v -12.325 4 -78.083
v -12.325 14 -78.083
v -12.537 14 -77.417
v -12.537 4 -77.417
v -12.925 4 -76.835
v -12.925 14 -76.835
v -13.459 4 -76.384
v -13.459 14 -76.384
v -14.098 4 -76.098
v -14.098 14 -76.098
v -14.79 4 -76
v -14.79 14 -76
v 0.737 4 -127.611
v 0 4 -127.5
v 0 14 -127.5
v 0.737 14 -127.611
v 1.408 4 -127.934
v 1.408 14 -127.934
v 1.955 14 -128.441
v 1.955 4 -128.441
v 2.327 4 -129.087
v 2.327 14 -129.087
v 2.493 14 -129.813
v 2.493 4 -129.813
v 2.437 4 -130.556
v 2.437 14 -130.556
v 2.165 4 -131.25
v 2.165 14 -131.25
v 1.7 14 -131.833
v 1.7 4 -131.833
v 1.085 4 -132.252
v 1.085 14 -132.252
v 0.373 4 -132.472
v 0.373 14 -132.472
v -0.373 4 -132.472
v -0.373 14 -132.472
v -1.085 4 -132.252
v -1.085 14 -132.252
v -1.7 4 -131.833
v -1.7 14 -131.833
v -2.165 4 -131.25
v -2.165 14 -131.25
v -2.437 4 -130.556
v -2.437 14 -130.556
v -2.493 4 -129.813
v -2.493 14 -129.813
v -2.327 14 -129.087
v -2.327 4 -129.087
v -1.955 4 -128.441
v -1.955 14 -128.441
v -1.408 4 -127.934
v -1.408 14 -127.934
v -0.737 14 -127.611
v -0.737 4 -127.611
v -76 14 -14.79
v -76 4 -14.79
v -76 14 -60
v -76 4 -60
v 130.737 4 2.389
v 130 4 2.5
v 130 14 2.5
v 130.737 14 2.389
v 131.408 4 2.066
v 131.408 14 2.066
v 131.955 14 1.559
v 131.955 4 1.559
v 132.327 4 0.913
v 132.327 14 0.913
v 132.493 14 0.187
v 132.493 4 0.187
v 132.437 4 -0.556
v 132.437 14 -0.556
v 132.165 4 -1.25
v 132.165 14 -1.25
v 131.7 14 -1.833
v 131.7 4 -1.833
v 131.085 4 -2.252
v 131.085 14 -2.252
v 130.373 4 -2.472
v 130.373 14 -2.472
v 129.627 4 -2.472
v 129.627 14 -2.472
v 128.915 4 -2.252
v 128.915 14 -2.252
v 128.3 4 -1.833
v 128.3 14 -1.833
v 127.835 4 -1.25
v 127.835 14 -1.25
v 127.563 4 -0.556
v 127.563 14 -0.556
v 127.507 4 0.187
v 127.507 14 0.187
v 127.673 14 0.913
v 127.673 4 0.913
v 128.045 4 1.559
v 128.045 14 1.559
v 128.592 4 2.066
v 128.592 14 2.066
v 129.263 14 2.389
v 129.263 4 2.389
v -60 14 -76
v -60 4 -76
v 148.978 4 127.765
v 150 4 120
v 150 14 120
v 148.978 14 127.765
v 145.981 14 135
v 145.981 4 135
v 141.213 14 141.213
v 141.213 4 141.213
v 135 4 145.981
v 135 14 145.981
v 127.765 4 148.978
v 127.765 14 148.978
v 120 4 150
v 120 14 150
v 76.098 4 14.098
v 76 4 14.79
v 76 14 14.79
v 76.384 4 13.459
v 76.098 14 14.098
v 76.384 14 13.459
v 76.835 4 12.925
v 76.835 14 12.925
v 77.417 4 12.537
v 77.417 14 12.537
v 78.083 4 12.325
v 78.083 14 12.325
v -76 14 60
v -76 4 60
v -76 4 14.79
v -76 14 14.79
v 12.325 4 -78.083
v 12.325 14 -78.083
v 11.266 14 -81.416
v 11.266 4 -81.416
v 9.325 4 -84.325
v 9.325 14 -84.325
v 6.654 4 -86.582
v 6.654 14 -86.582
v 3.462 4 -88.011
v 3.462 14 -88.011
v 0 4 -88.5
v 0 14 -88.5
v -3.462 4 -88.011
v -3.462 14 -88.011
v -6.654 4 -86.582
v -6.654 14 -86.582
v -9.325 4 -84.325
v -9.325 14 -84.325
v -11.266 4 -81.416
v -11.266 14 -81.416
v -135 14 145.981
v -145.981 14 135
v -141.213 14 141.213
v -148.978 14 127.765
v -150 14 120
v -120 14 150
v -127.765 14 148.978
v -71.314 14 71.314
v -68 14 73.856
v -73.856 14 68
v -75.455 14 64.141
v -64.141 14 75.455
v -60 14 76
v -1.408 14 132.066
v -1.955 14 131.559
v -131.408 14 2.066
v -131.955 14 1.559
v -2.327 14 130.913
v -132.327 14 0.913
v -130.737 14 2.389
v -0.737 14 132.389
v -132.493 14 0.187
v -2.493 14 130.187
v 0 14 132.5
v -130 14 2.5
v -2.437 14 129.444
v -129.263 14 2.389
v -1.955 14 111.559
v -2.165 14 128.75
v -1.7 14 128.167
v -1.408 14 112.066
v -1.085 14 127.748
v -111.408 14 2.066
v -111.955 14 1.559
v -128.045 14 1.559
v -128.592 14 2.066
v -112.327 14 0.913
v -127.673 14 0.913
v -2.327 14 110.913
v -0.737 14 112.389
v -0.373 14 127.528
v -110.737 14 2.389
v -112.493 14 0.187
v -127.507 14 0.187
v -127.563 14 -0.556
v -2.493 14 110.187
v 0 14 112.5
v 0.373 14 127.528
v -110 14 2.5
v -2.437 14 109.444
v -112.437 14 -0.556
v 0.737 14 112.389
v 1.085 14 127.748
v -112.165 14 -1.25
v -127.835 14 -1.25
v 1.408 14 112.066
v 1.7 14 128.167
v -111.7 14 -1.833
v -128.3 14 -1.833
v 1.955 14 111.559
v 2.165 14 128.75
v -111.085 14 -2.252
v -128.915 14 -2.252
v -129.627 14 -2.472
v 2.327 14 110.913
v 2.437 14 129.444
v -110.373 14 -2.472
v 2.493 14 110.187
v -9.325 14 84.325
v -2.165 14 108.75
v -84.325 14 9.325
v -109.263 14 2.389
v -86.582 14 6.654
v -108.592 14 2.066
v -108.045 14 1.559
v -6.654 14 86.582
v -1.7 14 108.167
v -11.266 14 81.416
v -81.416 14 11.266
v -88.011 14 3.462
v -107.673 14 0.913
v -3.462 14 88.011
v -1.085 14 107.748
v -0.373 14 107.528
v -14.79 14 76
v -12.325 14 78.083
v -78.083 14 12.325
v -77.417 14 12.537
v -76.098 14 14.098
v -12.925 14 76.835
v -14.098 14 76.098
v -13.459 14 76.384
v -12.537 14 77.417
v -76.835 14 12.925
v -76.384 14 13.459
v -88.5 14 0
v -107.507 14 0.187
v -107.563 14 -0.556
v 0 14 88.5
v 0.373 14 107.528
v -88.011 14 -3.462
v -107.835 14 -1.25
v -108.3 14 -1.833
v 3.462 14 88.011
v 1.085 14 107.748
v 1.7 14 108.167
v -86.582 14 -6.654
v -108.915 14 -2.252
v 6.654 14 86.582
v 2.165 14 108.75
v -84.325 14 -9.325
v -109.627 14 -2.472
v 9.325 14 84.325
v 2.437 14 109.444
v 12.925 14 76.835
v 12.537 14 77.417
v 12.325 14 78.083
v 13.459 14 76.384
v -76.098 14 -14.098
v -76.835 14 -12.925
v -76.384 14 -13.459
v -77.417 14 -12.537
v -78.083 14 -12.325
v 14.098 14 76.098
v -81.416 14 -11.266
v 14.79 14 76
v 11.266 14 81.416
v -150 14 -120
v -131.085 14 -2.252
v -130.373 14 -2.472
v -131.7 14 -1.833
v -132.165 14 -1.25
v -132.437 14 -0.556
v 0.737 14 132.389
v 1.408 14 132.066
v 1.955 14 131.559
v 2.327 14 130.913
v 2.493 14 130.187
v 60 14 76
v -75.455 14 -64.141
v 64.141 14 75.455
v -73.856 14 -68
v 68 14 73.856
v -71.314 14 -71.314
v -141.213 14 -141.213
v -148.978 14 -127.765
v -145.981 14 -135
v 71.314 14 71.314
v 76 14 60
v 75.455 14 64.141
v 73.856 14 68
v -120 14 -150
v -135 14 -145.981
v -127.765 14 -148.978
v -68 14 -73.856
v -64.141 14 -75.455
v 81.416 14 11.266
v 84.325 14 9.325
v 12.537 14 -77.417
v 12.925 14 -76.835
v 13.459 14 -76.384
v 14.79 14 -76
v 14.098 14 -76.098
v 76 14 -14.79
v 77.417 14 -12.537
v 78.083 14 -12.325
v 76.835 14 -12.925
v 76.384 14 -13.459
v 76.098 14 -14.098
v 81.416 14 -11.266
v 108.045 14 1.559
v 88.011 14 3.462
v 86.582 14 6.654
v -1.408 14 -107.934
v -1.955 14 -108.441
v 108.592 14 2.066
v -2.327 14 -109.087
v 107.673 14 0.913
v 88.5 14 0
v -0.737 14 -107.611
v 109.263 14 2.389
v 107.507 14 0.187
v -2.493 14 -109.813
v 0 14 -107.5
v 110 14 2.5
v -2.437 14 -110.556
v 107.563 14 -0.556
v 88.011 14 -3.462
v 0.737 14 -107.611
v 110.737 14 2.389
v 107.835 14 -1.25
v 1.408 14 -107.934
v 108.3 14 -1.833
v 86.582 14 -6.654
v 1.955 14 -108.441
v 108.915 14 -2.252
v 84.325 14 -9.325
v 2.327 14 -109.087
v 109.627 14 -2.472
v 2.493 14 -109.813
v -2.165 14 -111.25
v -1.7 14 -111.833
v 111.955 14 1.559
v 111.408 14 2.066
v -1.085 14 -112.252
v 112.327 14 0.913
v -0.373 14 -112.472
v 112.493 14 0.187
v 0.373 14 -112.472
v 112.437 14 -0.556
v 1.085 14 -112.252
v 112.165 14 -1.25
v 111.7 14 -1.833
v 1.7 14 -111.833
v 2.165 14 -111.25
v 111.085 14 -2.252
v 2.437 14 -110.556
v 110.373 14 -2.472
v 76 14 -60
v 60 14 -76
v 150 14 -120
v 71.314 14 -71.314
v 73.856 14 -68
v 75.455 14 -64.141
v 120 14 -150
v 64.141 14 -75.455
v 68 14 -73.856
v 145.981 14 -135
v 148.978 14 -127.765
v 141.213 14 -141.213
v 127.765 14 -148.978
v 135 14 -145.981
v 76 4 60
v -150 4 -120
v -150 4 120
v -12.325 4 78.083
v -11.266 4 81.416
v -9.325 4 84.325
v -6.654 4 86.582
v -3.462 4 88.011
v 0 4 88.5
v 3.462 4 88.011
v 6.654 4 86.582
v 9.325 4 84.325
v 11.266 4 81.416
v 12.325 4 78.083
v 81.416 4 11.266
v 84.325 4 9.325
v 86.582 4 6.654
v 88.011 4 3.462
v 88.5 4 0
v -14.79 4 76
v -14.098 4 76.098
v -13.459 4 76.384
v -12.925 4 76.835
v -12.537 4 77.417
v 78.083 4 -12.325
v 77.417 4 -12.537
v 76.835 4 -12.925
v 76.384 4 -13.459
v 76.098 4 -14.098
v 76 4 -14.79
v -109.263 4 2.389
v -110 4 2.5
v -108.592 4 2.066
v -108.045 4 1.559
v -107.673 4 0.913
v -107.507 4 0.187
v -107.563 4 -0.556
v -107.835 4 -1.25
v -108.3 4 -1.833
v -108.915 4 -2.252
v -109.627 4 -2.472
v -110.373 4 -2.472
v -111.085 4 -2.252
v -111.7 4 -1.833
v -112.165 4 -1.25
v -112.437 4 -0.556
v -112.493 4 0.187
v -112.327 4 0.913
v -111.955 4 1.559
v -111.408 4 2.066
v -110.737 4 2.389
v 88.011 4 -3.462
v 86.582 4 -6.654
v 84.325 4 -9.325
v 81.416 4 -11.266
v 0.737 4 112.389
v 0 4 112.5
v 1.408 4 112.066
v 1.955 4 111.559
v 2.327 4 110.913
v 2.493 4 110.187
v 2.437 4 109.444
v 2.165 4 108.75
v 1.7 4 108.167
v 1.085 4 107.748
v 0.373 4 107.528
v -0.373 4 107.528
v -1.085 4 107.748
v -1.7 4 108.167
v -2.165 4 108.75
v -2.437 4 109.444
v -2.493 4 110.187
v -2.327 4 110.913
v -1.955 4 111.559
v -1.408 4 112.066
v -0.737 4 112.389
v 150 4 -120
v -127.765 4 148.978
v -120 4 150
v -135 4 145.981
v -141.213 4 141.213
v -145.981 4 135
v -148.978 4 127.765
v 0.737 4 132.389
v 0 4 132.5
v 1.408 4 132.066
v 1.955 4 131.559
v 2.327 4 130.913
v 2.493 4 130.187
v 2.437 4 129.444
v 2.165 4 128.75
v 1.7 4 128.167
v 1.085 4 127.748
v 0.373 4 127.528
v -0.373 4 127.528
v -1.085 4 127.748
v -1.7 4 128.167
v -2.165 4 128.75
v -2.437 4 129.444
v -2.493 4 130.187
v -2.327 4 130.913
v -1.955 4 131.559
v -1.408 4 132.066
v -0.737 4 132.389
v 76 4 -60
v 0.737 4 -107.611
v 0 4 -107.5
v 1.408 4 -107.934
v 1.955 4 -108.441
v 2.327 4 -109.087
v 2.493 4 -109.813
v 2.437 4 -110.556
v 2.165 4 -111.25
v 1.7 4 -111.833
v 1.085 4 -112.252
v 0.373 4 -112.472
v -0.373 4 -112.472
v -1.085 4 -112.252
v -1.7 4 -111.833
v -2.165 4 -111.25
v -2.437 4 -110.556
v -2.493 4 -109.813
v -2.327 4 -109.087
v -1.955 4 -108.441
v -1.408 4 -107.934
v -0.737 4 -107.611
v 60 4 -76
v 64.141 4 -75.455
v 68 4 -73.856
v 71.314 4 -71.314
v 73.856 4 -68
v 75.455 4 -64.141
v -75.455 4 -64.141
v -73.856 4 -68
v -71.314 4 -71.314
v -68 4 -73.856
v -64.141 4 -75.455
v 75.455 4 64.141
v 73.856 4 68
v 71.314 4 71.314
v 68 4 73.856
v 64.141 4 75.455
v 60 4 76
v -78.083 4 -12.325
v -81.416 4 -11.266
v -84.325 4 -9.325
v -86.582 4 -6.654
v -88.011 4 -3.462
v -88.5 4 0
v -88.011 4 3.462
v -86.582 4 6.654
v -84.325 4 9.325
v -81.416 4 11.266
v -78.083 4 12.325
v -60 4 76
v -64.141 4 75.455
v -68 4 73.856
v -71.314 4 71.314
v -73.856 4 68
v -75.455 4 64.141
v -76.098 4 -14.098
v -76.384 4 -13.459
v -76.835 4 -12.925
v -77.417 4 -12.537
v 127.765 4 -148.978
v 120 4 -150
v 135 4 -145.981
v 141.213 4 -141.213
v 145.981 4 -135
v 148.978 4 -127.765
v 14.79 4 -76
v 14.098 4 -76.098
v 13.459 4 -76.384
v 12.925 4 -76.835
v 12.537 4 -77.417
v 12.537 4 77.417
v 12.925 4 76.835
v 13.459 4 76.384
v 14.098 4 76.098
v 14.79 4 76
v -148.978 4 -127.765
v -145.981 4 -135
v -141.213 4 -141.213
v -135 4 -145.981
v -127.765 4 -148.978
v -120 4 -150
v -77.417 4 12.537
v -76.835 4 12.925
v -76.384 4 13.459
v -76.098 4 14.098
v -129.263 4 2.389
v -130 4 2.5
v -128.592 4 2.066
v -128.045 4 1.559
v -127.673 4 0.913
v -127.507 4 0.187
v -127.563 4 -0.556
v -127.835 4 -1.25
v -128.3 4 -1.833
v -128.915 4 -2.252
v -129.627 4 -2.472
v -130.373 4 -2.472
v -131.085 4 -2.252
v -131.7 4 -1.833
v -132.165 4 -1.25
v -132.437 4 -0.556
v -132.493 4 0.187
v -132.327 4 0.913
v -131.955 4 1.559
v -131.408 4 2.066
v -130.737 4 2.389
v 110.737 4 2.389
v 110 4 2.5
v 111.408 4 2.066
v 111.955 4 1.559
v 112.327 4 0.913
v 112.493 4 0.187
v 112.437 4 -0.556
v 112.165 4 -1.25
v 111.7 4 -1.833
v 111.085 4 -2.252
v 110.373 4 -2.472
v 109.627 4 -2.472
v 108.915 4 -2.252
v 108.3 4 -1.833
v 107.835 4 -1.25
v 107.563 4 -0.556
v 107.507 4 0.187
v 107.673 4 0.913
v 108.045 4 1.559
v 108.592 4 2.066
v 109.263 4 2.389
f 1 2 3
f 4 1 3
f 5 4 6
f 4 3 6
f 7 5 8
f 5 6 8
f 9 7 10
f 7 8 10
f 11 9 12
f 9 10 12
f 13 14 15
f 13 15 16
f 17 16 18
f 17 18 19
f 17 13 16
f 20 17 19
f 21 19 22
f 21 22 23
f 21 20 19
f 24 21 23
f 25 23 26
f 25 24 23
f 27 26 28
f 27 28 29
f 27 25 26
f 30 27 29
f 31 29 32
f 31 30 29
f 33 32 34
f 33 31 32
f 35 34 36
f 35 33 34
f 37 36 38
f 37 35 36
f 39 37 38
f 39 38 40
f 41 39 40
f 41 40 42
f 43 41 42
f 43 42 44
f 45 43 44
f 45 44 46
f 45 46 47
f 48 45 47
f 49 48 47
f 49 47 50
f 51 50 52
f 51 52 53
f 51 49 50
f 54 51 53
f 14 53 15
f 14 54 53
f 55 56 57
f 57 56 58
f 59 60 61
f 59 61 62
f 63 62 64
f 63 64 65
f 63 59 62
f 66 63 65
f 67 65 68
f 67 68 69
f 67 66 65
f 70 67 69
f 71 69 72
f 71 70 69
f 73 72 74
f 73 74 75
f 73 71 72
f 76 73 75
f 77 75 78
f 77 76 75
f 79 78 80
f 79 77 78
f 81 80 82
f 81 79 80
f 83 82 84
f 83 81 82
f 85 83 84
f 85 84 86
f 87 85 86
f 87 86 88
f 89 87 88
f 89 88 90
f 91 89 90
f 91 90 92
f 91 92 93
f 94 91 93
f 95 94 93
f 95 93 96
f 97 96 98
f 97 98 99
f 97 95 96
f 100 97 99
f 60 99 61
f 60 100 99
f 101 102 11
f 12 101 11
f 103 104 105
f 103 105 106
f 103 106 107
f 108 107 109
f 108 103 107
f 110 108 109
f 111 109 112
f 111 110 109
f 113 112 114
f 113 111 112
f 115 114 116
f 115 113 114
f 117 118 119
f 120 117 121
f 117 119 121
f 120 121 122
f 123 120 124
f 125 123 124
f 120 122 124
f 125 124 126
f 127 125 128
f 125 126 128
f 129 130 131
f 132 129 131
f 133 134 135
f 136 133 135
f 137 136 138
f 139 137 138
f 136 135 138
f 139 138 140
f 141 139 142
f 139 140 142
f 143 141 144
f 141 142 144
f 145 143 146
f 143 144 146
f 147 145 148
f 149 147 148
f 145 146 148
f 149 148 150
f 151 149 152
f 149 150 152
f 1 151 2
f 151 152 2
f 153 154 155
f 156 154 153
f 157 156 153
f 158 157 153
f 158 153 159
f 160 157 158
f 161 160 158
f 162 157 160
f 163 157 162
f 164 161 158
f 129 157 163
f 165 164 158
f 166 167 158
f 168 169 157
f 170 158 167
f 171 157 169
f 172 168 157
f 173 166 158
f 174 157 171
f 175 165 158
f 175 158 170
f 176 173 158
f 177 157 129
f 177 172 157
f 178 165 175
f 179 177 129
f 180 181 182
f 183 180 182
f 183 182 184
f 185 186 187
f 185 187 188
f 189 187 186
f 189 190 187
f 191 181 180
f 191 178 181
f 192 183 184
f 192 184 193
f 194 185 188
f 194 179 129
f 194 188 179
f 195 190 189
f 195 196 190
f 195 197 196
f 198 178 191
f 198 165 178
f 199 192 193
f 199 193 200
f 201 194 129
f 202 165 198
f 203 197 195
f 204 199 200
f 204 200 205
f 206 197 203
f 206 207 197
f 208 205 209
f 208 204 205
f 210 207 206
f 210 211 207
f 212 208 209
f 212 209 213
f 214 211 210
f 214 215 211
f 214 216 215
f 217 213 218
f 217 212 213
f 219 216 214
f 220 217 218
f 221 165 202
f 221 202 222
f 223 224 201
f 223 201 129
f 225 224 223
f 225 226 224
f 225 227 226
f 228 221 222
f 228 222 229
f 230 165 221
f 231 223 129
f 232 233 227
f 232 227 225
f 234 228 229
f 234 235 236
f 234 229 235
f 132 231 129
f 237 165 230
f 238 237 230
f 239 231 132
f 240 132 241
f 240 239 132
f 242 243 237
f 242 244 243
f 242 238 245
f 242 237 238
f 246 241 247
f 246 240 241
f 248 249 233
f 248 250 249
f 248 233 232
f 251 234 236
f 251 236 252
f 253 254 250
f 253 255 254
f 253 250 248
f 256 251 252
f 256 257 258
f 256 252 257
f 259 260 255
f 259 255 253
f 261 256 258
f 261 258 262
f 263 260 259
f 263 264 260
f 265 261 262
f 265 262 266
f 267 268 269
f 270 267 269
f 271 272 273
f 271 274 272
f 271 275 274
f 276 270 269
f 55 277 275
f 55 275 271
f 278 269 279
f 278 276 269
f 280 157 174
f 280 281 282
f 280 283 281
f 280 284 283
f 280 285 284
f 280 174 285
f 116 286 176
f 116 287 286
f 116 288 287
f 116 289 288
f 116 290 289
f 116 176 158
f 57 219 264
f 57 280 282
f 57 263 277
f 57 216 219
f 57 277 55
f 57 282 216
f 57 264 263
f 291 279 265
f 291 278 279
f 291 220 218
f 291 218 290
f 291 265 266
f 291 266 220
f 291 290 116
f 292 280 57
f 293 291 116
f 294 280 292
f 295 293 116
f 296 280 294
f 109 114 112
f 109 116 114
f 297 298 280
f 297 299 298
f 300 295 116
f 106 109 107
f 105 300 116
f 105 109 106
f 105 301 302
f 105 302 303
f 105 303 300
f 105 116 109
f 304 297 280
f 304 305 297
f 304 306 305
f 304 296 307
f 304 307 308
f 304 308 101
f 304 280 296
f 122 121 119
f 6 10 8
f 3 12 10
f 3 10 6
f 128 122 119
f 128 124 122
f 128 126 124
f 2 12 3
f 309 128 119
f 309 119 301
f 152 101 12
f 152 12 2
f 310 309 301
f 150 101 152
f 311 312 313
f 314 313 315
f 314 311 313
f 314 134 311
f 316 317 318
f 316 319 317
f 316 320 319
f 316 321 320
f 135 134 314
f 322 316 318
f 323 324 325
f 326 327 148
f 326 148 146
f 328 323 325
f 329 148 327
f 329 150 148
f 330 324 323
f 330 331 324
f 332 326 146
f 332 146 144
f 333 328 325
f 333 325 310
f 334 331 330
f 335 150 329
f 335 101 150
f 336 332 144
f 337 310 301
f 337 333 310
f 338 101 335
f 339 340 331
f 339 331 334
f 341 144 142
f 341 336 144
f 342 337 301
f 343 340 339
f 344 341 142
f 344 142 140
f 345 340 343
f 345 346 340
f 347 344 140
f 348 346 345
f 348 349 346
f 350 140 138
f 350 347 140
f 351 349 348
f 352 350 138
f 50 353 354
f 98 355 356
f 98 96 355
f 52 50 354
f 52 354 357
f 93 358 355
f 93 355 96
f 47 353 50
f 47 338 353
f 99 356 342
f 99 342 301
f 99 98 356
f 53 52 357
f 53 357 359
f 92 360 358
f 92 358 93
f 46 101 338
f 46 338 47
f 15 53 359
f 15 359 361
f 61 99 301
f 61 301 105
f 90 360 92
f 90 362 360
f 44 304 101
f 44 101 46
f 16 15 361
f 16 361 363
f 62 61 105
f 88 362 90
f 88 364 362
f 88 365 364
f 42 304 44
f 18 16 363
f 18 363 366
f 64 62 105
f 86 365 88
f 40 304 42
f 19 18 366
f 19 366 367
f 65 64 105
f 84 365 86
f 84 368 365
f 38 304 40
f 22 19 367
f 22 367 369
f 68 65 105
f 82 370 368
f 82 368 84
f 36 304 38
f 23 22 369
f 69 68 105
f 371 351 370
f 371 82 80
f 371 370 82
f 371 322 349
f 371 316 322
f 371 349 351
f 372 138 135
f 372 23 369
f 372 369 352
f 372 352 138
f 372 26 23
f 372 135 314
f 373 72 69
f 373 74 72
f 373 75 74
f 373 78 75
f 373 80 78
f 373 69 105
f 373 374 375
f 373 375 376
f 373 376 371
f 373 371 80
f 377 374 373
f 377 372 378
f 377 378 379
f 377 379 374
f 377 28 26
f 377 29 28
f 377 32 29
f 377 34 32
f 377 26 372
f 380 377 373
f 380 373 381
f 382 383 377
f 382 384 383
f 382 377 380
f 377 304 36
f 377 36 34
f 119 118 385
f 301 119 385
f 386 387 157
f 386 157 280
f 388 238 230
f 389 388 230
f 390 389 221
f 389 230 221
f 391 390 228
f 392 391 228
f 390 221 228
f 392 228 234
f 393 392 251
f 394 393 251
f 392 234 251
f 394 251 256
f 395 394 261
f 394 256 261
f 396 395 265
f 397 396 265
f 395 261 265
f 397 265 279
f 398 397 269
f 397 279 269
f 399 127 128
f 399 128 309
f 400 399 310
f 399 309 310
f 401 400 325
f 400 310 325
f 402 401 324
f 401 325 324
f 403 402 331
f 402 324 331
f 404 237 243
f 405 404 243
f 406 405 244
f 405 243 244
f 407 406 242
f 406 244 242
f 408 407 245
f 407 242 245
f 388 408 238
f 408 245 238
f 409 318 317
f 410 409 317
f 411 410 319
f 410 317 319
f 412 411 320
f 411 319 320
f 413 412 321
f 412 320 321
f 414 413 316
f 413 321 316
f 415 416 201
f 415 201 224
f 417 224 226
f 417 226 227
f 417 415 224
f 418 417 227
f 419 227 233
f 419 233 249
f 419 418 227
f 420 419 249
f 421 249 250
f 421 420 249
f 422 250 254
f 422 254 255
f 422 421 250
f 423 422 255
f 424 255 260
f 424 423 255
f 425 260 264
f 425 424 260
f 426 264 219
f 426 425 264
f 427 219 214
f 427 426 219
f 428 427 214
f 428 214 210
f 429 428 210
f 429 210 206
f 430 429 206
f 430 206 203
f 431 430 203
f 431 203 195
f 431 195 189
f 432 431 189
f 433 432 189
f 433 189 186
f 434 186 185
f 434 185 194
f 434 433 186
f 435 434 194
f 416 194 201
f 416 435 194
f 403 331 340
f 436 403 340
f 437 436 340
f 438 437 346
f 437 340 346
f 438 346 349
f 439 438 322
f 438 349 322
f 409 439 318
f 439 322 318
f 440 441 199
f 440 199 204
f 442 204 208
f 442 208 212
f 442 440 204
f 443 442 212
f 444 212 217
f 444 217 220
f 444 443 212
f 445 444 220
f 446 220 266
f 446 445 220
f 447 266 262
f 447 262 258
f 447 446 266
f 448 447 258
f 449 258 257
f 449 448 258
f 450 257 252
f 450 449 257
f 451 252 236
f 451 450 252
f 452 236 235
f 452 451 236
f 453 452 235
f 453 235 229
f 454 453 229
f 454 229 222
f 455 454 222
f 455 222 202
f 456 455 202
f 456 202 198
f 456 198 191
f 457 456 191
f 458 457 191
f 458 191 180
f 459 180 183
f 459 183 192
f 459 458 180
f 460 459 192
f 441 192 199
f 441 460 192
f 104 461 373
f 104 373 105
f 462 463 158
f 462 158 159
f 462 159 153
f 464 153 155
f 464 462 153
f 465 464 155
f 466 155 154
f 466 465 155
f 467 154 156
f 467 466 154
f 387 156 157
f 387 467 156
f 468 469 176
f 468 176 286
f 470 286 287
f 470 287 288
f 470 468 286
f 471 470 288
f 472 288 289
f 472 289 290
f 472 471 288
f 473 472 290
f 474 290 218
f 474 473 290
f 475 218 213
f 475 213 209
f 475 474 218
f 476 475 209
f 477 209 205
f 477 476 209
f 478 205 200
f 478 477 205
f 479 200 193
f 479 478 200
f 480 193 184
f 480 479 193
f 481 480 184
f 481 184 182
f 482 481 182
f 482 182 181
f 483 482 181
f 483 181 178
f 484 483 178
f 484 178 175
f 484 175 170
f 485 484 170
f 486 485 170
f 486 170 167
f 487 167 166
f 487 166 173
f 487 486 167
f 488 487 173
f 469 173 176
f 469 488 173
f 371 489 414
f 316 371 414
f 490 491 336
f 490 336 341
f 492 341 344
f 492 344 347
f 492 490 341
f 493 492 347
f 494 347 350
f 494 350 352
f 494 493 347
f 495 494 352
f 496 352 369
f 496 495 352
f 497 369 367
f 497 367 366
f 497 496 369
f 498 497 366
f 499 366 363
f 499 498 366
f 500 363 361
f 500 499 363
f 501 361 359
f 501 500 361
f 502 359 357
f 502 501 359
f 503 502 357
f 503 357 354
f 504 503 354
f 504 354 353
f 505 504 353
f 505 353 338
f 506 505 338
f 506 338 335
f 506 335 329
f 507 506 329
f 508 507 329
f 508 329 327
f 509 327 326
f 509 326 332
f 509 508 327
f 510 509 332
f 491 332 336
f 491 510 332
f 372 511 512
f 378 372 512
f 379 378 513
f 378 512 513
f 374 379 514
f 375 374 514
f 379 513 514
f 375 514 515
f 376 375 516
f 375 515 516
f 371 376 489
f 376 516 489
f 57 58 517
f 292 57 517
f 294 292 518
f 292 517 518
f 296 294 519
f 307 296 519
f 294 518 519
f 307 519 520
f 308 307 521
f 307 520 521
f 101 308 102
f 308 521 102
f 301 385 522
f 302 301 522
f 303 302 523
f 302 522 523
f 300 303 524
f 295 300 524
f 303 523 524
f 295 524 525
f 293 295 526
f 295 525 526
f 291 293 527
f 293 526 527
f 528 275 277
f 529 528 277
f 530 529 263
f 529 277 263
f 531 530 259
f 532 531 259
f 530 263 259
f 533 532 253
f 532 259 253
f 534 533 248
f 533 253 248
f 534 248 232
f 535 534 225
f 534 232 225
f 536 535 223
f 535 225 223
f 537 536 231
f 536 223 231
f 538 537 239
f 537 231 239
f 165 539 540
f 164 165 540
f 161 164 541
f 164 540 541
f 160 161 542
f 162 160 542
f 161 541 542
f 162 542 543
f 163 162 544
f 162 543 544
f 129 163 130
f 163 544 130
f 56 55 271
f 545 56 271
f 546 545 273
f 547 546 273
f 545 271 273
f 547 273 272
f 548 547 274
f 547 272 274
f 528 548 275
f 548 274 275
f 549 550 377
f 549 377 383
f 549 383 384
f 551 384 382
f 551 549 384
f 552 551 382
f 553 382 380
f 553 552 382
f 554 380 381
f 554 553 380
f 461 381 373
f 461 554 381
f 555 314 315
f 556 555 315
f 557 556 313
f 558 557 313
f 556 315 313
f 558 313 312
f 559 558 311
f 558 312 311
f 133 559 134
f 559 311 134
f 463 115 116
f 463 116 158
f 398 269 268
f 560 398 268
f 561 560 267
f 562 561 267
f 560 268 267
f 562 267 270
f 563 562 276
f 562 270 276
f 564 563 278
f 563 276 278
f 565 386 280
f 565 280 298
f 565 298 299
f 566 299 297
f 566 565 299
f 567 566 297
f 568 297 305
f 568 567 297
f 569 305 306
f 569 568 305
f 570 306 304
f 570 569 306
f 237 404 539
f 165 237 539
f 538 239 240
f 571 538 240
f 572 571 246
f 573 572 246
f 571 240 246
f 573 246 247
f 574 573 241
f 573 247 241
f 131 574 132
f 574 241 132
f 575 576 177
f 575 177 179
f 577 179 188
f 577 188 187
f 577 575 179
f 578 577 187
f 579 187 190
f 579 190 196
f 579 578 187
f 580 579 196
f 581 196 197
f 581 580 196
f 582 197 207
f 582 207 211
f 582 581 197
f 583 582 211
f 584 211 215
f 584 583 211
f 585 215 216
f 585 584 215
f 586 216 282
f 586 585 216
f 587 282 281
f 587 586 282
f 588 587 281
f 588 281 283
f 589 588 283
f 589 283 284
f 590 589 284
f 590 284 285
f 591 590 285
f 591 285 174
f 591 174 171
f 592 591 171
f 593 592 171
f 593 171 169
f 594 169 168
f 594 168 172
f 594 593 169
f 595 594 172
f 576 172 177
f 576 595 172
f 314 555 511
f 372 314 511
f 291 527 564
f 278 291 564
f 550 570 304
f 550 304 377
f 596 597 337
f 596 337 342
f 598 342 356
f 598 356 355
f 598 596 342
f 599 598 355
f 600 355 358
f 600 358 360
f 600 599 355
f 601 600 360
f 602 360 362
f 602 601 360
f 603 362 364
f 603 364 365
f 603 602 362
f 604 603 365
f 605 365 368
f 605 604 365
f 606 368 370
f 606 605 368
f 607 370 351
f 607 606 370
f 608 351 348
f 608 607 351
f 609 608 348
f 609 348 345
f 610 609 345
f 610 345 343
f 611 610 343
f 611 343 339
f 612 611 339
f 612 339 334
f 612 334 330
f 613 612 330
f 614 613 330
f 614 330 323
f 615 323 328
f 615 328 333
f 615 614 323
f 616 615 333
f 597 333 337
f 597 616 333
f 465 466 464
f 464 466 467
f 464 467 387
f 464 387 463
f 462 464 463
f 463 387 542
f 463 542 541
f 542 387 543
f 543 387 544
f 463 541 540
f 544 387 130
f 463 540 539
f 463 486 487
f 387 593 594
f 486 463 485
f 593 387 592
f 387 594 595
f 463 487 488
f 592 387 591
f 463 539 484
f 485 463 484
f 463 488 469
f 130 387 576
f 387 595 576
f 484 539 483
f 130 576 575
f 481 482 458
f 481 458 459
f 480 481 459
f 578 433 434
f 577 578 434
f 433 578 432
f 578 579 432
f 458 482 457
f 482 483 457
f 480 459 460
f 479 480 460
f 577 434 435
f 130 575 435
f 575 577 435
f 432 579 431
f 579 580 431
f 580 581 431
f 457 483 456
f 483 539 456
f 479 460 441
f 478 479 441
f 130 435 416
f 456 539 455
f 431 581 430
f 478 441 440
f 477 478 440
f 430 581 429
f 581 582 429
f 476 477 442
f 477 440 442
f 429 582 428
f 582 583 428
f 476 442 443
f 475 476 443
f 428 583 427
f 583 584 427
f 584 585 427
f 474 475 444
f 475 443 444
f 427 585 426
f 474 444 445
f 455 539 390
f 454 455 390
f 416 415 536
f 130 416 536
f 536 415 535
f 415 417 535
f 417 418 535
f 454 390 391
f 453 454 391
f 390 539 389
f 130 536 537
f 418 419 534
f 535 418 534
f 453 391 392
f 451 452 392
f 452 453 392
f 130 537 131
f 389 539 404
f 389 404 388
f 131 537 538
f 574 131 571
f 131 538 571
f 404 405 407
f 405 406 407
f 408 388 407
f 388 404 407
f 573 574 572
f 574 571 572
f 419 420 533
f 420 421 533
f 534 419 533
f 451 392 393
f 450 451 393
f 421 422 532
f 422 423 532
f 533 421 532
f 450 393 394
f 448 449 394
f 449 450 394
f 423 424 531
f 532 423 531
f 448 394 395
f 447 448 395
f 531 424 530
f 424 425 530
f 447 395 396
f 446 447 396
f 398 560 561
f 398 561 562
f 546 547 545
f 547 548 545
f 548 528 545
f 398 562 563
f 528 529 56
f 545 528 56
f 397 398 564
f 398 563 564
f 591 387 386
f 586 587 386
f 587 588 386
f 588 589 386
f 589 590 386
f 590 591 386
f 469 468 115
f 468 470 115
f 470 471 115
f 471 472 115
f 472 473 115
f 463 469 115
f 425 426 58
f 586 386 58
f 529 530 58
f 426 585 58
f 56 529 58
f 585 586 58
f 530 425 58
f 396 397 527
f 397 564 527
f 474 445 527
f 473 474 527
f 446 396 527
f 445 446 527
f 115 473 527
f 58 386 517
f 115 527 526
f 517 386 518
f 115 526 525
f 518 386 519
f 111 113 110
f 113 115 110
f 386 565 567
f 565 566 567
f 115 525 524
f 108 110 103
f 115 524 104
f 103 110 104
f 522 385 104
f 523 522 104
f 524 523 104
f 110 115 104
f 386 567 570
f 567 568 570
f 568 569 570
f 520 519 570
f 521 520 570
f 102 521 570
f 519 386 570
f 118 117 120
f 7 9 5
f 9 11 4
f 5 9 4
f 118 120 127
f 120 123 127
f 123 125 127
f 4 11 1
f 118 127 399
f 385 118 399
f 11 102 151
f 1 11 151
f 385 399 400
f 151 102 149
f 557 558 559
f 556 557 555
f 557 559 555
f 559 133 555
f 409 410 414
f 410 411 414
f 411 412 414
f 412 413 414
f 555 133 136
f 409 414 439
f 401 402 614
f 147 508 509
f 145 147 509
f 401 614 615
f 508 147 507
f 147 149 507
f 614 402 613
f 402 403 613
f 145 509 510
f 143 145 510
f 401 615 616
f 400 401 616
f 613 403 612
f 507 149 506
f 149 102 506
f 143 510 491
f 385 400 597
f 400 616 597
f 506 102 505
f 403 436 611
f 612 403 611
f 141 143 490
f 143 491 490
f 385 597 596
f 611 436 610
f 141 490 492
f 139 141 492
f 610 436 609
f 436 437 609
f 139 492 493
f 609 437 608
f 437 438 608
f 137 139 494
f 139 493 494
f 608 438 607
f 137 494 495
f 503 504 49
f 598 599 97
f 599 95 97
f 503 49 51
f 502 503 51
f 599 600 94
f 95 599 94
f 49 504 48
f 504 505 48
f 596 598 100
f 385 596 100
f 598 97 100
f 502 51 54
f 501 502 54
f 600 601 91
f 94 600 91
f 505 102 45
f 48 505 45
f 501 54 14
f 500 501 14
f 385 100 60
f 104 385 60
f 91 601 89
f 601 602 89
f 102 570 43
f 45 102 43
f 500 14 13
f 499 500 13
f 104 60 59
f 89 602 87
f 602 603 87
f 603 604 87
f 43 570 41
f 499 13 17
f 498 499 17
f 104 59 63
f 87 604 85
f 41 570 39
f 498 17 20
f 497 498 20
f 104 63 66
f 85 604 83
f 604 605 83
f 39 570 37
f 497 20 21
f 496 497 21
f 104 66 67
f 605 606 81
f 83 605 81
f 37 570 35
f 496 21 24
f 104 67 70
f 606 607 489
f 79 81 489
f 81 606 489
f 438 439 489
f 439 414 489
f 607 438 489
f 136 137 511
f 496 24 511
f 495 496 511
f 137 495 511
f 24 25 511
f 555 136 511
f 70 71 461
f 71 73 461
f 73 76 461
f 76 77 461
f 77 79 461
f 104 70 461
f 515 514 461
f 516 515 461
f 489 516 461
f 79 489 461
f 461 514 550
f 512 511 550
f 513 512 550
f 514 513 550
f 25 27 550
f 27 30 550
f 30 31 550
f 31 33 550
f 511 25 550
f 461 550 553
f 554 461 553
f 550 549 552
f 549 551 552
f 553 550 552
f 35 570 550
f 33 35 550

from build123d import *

# Parameters (mm, degrees)
BOSS_EXTRUDE3_DEPTH = 4
SKETCH2_R           = 2.5
BOSS_EXTRUDE4_DEPTH = 10
CUT_EXTRUDE1_DEPTH  = 52
CUT_EXTRUDE2_DEPTH  = 10


with BuildPart() as part:
    # Sketch1 → Boss-Extrude3 (new body)
    with BuildSketch(Plane(origin=(0, 0, 0), x_dir=(1, 0, 0), z_dir=(0, 1, 0))):
        with BuildLine():
            ThreePointArc((-75, -60), (-70.606601718, -70.606601718), (-60, -75))
            Line((-60, -75), (60, -75))
            ThreePointArc((60, -75), (70.606601718, -70.606601718), (75, -60))
            Line((75, -60), (75, 60))
            ThreePointArc((75, 60), (70.606601718, 70.606601718), (60, 75))
            Line((60, 75), (-60, 75))
            ThreePointArc((-60, 75), (-70.606601718, 70.606601718), (-75, 60))
            Line((-75, 60), (-75, -60))
        make_face()
    extrude(amount=BOSS_EXTRUDE3_DEPTH)

    # Sketch3 → Cut-Extrude1 (cut)
    with BuildSketch(Plane(origin=(0, 14, 0), x_dir=(1, 0, 0), z_dir=(0, 1, 0))):
        with BuildLine():
            Line((-60, 76), (60, 76))
            ThreePointArc((60, 76), (71.313708499, 71.313708499), (76, 60))
            Line((76, 60), (76, -60))
            ThreePointArc((76, -60), (71.313708499, -71.313708499), (60, -76))
            Line((60, -76), (-60, -76))
            ThreePointArc((-60, -76), (-71.313708499, -71.313708499), (-76, -60))
            Line((-76, -60), (-76, 60))
            ThreePointArc((-76, 60), (-71.313708499, 71.313708499), (-60, 76))
        make_face()
    extrude(amount=-CUT_EXTRUDE1_DEPTH, mode=Mode.SUBTRACT)


with BuildPart() as body_2:
    # Sketch2 → Boss-Extrude4 (new body)
    # profile 1 of 5: a face of its own
    with BuildSketch(Plane(origin=(0, 4, 0), x_dir=(1, 0, 0), z_dir=(0, 1, 0))):
        with BuildLine():
            ThreePointArc((150, -120), (141.213203436, -141.213203436), (120, -150))
            Line((120, -150), (-120, -150))
            ThreePointArc((-120, -150), (-141.213203436, -141.213203436), (-150, -120))
            Line((-150, -120), (-150, 120))
            ThreePointArc((-150, 120), (-141.213203436, 141.213203436), (-120, 150))
            Line((-120, 150), (120, 150))
            ThreePointArc((120, 150), (141.213203436, 141.213203436), (150, 120))
            Line((150, 120), (150, -120))
        make_face()
        with Locations(Location((-110, 0, 0), (0, 0, 270))):
            Circle(SKETCH2_R, mode=Mode.SUBTRACT)
        with Locations(Location((-130, 0, 0), (0, 0, 270))):
            Circle(SKETCH2_R, mode=Mode.SUBTRACT)
        with Locations(Location((130, 0, 0), (0, 0, 270))):
            Circle(SKETCH2_R, mode=Mode.SUBTRACT)
        with Locations(Location((110, 0, 0), (0, 0, 270))):
            Circle(SKETCH2_R, mode=Mode.SUBTRACT)
        with Locations(Location((0, -130, 0), (0, 0, 270))):
            Circle(SKETCH2_R, mode=Mode.SUBTRACT)
        with Locations(Location((0, -110, 0), (0, 0, 270))):
            Circle(SKETCH2_R, mode=Mode.SUBTRACT)
        with Locations(Location((0, 110, 0), (0, 0, 270))):
            Circle(SKETCH2_R, mode=Mode.SUBTRACT)
        with Locations(Location((0, 130, 0), (0, 0, 270))):
            Circle(SKETCH2_R, mode=Mode.SUBTRACT)
        Polygon((-76, -76), (-76, 76), (0, 76), (76, 76), (76, -76), align=None, mode=Mode.SUBTRACT)
    # profile 2 of 5: a face of its own
    with BuildSketch(Plane(origin=(0, 4, 0), x_dir=(1, 0, 0), z_dir=(0, 1, 0))):
        with BuildLine():
            ThreePointArc((-60, -76), (-71.313708499, -71.313708499), (-76, -60))
            Line((-76, -60), (-76, -76))
            Line((-76, -76), (-60, -76))
        make_face()
    # profile 3 of 5: a face of its own
    with BuildSketch(Plane(origin=(0, 4, 0), x_dir=(1, 0, 0), z_dir=(0, 1, 0))):
        with BuildLine():
            Line((76, -76), (76, -60))
            ThreePointArc((76, -60), (71.313708499, -71.313708499), (60, -76))
            Line((60, -76), (76, -76))
        make_face()
    # profile 4 of 5: a face of its own
    with BuildSketch(Plane(origin=(0, 4, 0), x_dir=(1, 0, 0), z_dir=(0, 1, 0))):
        with BuildLine():
            Line((76, 76), (60, 76))
            ThreePointArc((60, 76), (71.313708499, 71.313708499), (76, 60))
            Line((76, 60), (76, 76))
        make_face()
    # profile 5 of 5: a face of its own
    with BuildSketch(Plane(origin=(0, 4, 0), x_dir=(1, 0, 0), z_dir=(0, 1, 0))):
        with BuildLine():
            ThreePointArc((-76, 60), (-71.313708499, 71.313708499), (-60, 76))
            Line((-60, 76), (-76, 76))
            Line((-76, 76), (-76, 60))
        make_face()
    extrude(amount=BOSS_EXTRUDE4_DEPTH)

    # Sketch4 → Cut-Extrude2 (cut)
    with BuildSketch(Plane(origin=(0, 14, 0), x_dir=(1, 0, 0), z_dir=(0, 1, 0))):
        with BuildLine():
            Line((-12.5, 76), (12.5, 76))
            ThreePointArc((12.5, 76), (12.456214868, 77.045328257), (12.325166214, 78.08333334))
            ThreePointArc((12.325166214, 78.08333334), (-7.4e-08, 88.5), (-12.325166239, 78.083333193))
            ThreePointArc((-12.325166239, 78.083333193), (-12.456214874, 77.045328183), (-12.5, 76))
        make_face()
        with BuildLine():
            ThreePointArc((-12.5, 76), (0, 63.5), (12.5, 76))
            Line((12.5, 76), (-12.5, 76))
        make_face()
        with BuildLine():
            Line((-14.790199458, 76), (-12.5, 76))
            ThreePointArc((-12.5, 76), (-12.456214874, 77.045328183), (-12.325166239, 78.083333193))
            ThreePointArc((-12.325166239, 78.083333193), (-13.176456451, 76.590593415), (-14.790199458, 76))
        make_face()
        with BuildLine():
            ThreePointArc((12.325166214, 78.08333334), (12.456214868, 77.045328257), (12.5, 76))
            Line((12.5, 76), (14.790199431, 76))
            ThreePointArc((14.790199431, 76), (13.176456384, 76.590593471), (12.325166214, 78.08333334))
        make_face()
        with BuildLine():
            ThreePointArc((-76, -12.5), (-67.161165235, -8.838834765), (-63.5, 0))
            ThreePointArc((-63.5, 0), (-67.161165235, 8.838834765), (-76, 12.5))
            Line((-76, 12.5), (-76, -12.5))
        make_face()
        with BuildLine():
            Line((-76, -12.5), (-76, 12.5))
            ThreePointArc((-76, 12.5), (-77.045330875, 12.456214648), (-78.083338522, 12.325165338))
            ThreePointArc((-78.083338522, 12.325165338), (-88.5, -1.364e-06), (-78.083335831, -12.325165793))
            ThreePointArc((-78.083335831, -12.325165793), (-77.045329516, -12.456214762), (-76, -12.5))
        make_face()
        with BuildLine():
            ThreePointArc((-78.083338522, 12.325165338), (-77.045330875, 12.456214648), (-76, 12.5))
            Line((-76, 12.5), (-76, 14.790199458))
            ThreePointArc((-76, 14.790199458), (-76.590595159, 13.176454387), (-78.083338522, 12.325165338))
        make_face()
        with BuildLine():
            Line((-76, -14.790199458), (-76, -12.5))
            ThreePointArc((-76, -12.5), (-77.045329516, -12.456214762), (-78.083335831, -12.325165793))
            ThreePointArc((-78.083335831, -12.325165793), (-76.590594278, -13.17645543), (-76, -14.790199458))
        make_face()
        with BuildLine():
            Line((-12.5, -76), (12.5, -76))
            ThreePointArc((12.5, -76), (0, -63.5), (-12.5, -76))
        make_face()
        with BuildLine():
            ThreePointArc((12.325166095, -78.08333404), (12.456214838, -77.04532861), (12.5, -76))
            Line((12.5, -76), (-12.5, -76))
            ThreePointArc((-12.5, -76), (-12.456214619, -77.045331227), (-12.32516522, -78.083339217))
            ThreePointArc((-12.32516522, -78.083339217), (2.625e-06, -88.5), (12.325166095, -78.08333404))
        make_face()
        with BuildLine():
            ThreePointArc((-12.32516522, -78.083339217), (-12.456214619, -77.045331227), (-12.5, -76))
            Line((-12.5, -76), (-14.790199456, -76))
            ThreePointArc((-14.790199456, -76), (-13.176454117, -76.590595387), (-12.32516522, -78.083339217))
        make_face()
        with BuildLine():
            Line((14.790199458, -76), (12.5, -76))
            ThreePointArc((12.5, -76), (12.456214838, -77.04532861), (12.325166095, -78.08333404))
            ThreePointArc((12.325166095, -78.08333404), (13.176456123, -76.590593692), (14.790199458, -76))
        make_face()
        with BuildLine():
            ThreePointArc((78.083330118, -12.325166758), (85.547031645, -8.06871655), (88.5, 0))
            ThreePointArc((88.5, 0), (85.547032724, 8.068715273), (78.083333414, 12.325166201))
            ThreePointArc((78.083333414, 12.325166201), (77.045328294, 12.456214865), (76, 12.5))
            Line((76, 12.5), (76, -12.5))
            ThreePointArc((76, -12.5), (77.045326629, -12.456215005), (78.083330118, -12.325166758))
        make_face()
        with BuildLine():
            Line((76, -12.5), (76, 12.5))
            ThreePointArc((76, 12.5), (63.5, 0), (76, -12.5))
        make_face()
        with BuildLine():
            ThreePointArc((76, 12.5), (77.045328294, 12.456214865), (78.083333414, 12.325166201))
            ThreePointArc((78.083333414, 12.325166201), (76.590593423, 13.176456442), (76, 14.790199657))
            Line((76, 14.790199657), (76, 12.5))
        make_face()
        with BuildLine():
            ThreePointArc((76, -14.790199258), (76.590592472, -13.176457566), (78.083330118, -12.325166758))
            ThreePointArc((78.083330118, -12.325166758), (77.045326629, -12.456215005), (76, -12.5))
            Line((76, -12.5), (76, -14.790199258))
        make_face()
    extrude(amount=-CUT_EXTRUDE2_DEPTH, mode=Mode.SUBTRACT)


solid = body_2.part
